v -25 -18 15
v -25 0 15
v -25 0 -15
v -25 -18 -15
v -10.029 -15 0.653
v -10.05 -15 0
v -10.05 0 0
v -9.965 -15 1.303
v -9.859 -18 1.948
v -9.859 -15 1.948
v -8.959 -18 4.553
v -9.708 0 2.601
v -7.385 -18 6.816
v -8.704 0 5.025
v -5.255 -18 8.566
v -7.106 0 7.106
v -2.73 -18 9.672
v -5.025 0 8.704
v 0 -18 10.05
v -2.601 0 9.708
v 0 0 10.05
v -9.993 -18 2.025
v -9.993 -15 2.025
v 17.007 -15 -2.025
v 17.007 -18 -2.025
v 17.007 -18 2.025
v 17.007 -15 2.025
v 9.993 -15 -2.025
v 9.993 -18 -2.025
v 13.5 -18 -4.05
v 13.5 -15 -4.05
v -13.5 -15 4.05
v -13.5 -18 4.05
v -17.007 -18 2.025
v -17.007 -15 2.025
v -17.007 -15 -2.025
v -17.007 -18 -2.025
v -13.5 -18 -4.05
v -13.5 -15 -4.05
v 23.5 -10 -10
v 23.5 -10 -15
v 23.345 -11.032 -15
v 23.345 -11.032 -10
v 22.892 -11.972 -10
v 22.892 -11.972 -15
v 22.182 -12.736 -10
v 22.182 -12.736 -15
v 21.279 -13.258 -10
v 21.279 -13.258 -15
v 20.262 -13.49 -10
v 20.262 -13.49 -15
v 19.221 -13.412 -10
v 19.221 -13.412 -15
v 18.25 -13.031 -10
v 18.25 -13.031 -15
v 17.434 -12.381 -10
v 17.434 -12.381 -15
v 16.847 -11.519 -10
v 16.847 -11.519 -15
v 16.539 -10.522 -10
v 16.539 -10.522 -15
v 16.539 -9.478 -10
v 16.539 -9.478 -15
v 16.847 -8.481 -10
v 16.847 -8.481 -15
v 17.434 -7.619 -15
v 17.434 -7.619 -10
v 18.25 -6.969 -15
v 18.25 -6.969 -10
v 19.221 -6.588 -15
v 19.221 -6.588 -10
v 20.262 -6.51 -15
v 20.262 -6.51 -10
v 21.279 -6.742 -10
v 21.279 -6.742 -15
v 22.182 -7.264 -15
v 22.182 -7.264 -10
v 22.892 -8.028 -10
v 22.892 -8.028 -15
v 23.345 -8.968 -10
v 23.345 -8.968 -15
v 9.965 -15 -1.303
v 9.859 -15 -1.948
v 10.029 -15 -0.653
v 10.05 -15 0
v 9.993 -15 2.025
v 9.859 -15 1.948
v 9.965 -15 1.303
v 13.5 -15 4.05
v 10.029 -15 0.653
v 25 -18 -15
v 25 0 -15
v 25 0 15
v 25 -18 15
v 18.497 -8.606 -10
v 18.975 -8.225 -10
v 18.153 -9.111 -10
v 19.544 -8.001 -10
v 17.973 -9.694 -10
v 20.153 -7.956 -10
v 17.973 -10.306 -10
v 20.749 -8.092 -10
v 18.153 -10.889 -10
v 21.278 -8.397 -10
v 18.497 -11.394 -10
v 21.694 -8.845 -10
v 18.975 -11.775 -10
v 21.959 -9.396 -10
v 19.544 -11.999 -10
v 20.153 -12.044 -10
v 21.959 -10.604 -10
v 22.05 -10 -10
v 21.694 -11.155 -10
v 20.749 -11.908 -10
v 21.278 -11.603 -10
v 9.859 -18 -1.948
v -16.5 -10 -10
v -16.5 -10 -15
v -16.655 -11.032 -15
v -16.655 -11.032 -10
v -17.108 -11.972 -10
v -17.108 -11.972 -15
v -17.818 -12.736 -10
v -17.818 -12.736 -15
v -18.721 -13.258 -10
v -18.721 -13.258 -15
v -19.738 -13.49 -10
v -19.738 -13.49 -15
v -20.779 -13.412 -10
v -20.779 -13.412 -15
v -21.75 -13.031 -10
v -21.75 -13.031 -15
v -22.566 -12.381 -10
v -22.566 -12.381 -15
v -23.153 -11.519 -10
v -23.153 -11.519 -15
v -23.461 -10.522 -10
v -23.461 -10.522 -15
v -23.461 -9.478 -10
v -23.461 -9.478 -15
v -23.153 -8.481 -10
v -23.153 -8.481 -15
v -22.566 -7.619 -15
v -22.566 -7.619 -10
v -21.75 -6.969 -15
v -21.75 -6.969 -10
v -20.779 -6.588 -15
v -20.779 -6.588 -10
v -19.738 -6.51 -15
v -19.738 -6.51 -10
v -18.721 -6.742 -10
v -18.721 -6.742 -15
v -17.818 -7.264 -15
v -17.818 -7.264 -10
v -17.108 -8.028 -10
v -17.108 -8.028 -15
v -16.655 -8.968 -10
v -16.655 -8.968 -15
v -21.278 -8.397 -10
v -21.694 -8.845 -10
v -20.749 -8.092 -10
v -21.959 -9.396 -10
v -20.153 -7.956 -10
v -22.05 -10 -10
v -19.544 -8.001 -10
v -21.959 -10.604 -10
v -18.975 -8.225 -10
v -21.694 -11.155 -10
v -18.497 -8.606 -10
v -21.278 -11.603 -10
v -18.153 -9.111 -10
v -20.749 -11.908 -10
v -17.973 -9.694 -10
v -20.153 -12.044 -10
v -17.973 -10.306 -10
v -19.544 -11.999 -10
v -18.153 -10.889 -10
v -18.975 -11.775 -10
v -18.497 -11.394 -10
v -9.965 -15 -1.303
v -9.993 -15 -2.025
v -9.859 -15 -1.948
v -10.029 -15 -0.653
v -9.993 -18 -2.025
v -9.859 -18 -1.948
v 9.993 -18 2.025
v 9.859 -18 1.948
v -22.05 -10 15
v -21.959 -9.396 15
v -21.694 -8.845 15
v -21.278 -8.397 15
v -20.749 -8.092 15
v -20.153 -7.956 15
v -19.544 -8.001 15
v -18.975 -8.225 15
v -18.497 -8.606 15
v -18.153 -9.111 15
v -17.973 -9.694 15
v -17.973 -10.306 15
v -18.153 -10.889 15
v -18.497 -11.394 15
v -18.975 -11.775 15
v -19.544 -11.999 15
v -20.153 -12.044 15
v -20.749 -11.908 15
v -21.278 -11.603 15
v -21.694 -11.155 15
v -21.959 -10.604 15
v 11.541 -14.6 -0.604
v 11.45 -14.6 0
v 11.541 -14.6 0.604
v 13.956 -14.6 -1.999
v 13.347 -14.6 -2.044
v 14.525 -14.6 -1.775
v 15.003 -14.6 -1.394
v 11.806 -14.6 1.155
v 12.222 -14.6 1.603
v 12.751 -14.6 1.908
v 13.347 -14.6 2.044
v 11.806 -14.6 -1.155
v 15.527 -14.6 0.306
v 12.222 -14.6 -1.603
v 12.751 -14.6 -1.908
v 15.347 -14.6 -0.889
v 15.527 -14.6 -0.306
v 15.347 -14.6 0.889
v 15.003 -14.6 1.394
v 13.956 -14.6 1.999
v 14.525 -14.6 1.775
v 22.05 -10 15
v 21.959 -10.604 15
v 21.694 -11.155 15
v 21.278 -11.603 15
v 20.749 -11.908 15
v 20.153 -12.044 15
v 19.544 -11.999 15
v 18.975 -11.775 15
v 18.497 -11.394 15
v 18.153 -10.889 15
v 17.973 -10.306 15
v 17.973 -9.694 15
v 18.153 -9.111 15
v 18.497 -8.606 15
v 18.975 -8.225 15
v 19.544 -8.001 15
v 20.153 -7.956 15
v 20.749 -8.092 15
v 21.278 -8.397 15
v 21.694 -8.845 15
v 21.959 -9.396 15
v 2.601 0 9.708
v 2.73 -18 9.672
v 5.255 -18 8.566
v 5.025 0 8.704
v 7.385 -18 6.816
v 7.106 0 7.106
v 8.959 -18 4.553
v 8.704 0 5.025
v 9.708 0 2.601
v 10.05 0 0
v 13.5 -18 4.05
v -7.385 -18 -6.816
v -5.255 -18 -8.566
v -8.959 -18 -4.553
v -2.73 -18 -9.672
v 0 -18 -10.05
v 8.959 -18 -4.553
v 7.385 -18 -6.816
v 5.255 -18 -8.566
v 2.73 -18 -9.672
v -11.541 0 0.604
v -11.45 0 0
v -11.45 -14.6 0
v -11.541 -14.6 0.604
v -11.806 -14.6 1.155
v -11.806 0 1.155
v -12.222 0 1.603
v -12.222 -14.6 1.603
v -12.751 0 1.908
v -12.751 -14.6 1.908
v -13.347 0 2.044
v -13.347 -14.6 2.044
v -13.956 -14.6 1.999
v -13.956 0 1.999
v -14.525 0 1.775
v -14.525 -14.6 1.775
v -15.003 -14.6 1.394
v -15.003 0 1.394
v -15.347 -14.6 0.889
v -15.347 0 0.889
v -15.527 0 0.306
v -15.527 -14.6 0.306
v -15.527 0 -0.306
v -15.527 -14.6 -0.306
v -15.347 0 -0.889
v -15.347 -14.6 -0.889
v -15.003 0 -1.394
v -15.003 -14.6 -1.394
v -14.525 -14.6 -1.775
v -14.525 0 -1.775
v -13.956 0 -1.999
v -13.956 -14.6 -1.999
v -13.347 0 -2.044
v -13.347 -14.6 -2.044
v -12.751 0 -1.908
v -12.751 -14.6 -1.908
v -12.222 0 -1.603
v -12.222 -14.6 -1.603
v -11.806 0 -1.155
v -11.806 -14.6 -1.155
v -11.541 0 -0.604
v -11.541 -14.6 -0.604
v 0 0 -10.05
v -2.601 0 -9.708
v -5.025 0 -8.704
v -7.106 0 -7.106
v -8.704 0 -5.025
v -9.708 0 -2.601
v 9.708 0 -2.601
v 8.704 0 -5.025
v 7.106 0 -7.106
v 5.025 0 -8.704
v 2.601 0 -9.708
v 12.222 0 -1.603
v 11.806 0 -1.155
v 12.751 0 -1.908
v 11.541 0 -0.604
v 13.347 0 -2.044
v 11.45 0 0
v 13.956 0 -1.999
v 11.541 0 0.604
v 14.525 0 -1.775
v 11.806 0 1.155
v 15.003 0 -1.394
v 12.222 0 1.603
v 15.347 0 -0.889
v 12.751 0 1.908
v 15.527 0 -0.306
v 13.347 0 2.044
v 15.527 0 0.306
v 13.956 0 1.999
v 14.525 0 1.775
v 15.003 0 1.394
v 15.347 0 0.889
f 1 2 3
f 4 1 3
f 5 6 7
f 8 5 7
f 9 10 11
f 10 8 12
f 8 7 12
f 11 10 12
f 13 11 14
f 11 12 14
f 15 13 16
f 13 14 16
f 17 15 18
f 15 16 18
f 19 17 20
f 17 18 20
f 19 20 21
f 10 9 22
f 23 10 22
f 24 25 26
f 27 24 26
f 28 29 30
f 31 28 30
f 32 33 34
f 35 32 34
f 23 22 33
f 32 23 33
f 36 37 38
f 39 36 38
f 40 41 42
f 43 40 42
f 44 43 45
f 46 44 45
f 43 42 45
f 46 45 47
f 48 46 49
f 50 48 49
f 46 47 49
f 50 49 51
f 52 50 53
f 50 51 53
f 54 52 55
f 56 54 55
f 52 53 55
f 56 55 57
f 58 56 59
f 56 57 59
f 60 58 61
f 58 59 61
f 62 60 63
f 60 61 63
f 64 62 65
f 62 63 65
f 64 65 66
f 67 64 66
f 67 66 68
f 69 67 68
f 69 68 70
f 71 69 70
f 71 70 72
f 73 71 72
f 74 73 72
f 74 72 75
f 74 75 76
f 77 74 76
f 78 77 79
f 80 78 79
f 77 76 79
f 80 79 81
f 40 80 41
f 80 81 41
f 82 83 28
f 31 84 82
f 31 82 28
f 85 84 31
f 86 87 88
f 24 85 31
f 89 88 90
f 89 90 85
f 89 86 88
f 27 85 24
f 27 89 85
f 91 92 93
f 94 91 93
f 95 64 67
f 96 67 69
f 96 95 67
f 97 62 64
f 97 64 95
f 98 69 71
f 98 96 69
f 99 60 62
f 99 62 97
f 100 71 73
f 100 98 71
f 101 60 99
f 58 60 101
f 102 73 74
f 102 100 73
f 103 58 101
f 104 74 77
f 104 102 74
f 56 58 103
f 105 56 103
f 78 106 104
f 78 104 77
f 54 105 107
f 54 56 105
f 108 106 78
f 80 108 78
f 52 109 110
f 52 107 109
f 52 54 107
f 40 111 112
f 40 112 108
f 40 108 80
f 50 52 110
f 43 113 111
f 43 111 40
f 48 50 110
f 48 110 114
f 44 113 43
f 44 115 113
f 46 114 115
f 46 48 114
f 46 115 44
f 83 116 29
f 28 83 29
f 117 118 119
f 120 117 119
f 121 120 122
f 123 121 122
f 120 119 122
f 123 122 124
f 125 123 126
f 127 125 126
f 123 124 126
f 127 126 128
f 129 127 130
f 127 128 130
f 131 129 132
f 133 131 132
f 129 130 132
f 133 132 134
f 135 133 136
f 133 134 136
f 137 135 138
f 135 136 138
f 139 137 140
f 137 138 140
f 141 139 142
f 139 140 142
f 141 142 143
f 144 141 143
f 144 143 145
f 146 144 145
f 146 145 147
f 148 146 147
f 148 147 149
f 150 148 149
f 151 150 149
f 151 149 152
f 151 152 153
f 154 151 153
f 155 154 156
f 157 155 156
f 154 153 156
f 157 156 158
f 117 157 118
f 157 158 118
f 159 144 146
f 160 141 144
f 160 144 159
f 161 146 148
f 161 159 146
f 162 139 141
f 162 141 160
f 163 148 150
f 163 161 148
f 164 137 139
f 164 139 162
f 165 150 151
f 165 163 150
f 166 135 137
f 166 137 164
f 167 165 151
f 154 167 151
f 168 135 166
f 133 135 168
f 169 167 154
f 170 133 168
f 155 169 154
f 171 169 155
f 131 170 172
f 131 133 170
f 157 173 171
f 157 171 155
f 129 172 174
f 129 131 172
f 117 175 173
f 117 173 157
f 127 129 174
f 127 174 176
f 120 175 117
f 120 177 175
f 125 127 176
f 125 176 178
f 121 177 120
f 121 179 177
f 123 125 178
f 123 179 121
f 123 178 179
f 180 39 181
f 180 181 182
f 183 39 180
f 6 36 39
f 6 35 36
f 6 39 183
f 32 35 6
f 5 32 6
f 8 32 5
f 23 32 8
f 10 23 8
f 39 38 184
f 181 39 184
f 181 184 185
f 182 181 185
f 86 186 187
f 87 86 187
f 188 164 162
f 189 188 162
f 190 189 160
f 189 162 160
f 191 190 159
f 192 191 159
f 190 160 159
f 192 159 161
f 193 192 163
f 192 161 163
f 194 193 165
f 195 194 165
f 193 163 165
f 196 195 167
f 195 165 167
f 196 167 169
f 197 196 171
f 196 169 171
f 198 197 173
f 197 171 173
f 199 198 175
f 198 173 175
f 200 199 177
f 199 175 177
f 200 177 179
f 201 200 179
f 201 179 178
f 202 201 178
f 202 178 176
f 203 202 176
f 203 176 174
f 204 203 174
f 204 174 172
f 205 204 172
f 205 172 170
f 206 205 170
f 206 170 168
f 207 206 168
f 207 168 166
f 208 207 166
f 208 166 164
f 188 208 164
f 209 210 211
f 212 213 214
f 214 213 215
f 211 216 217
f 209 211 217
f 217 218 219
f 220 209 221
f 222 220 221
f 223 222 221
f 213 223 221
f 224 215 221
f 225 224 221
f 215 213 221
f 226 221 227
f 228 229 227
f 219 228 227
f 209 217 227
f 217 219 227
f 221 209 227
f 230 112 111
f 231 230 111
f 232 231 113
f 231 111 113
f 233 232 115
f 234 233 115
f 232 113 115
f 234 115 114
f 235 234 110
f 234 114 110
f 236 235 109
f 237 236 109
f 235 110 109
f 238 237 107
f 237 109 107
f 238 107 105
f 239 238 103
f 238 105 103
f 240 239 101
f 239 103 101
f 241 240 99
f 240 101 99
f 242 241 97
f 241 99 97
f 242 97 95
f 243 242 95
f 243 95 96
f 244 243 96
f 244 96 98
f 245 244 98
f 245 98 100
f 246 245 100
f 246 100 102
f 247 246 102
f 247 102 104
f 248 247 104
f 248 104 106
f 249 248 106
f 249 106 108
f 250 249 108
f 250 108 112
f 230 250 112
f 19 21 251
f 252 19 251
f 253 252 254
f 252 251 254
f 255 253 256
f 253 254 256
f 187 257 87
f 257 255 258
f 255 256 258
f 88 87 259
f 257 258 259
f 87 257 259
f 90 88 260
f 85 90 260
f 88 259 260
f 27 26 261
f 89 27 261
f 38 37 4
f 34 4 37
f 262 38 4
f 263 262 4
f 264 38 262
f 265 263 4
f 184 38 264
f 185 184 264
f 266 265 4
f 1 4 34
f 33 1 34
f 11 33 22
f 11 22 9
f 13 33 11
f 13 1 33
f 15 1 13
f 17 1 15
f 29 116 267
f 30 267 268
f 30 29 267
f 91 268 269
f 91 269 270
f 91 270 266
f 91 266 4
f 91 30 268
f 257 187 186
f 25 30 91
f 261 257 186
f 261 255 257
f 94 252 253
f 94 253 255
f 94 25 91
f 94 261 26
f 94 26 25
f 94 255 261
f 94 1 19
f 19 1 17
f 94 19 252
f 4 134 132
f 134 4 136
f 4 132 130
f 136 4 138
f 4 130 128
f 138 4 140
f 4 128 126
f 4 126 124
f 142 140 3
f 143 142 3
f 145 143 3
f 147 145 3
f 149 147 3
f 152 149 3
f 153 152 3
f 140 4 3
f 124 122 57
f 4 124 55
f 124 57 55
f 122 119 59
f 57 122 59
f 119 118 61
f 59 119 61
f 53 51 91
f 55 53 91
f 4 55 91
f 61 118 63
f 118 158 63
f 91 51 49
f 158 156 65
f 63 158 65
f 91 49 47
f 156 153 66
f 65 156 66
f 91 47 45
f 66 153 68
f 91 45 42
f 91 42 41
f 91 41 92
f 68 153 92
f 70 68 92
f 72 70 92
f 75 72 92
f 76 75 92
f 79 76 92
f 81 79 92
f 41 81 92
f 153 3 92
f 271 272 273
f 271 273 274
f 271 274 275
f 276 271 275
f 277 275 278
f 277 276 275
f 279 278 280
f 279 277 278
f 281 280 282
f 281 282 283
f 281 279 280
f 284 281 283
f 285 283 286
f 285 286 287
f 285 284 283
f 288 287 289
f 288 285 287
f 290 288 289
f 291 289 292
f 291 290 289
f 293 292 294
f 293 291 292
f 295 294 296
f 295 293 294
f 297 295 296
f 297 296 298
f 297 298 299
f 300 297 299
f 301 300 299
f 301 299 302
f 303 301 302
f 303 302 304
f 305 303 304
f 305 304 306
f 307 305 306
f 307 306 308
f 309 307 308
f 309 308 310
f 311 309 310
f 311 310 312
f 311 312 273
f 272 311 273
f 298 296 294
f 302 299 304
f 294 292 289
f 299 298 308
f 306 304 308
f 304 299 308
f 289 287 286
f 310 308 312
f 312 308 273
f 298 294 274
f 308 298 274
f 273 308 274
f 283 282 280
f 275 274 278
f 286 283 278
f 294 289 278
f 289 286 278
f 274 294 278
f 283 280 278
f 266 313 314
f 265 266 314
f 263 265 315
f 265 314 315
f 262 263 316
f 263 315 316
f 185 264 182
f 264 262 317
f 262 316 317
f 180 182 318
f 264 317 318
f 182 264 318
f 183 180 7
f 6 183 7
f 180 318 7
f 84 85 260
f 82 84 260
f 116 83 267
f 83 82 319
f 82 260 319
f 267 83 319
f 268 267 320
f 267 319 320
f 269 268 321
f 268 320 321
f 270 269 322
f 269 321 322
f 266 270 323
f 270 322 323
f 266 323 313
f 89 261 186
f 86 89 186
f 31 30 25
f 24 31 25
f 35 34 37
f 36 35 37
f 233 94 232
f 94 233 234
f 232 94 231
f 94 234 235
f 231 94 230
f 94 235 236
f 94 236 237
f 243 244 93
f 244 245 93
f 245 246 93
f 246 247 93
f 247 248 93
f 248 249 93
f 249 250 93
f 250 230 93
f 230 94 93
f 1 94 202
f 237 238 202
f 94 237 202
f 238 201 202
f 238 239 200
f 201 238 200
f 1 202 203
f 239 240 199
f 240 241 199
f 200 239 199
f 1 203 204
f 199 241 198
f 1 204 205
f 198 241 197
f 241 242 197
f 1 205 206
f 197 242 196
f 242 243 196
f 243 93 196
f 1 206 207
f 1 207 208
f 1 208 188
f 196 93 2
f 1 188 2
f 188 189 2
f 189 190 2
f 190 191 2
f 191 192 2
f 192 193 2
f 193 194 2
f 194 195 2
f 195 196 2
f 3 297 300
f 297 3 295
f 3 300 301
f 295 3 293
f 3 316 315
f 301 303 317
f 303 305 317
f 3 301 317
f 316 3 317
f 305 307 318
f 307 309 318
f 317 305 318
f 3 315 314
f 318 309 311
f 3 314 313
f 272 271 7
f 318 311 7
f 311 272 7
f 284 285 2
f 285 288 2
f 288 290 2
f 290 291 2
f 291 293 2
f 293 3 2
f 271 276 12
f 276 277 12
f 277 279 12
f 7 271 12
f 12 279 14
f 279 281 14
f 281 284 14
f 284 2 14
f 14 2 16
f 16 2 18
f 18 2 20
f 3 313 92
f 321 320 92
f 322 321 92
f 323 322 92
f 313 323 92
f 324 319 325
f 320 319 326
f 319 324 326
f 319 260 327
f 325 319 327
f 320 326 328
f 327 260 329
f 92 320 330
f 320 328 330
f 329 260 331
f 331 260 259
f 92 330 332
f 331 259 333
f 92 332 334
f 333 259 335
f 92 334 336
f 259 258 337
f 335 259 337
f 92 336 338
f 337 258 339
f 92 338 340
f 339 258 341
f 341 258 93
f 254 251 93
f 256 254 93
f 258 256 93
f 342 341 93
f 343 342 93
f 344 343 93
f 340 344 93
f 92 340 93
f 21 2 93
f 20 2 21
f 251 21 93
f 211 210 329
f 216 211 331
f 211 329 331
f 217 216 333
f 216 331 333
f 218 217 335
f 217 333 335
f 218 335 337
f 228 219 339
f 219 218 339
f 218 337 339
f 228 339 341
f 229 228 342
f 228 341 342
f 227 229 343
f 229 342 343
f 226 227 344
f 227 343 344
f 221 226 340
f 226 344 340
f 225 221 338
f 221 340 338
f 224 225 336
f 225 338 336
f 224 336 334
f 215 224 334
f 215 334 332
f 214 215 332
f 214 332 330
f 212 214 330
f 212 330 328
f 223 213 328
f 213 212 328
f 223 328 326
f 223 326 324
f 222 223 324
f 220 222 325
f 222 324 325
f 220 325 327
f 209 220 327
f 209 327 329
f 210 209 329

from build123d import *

# Parameters (mm, degrees)
F0_R      = 2.05
F1_DEPTH  = 18
F3_DEPTH  = 30
F4_R      = 3.5
F5_DEPTH  = 5
F7_DEPTH  = 3
F8_R      = 2.05
F9_R      = 2.05
F10_DEPTH = 0.4


with BuildPart() as f1:
    # F0 (on Front) → F1 (new body)
    with BuildSketch(Plane.XZ):
        with BuildLine():
            ThreePointArc((0, 10.05), (7.1064231509, 7.1064231509), (10.05, 0))
            ThreePointArc((10.05, 0), (7.1064231509, -7.1064231509), (0, -10.05))
            Line((0, -10.05), (0, -15))
            Line((0, -15), (25, -15))
            Line((25, -15), (25, 0))
            Line((25, 0), (25, 15))
            Line((25, 15), (0, 15))
            Line((0, 15), (0, 10.05))
        make_face()
        with BuildLine():
            ThreePointArc((15.55, 0), (13.5, -2.05), (11.45, 0))
            ThreePointArc((11.45, 0), (13.5, 2.05), (15.55, 0))
        make_face(mode=Mode.SUBTRACT)
        with BuildLine():
            ThreePointArc((-10.05, 0), (-7.1064231509, 7.1064231509), (0, 10.05))
            Line((0, 10.05), (0, 15))
            Line((0, 15), (-25, 15))
            Line((-25, 15), (-25, 0))
            Line((-25, 0), (-25, -15))
            Line((-25, -15), (0, -15))
            Line((0, -15), (0, -10.05))
            ThreePointArc((0, -10.05), (-7.1064231509, -7.1064231509), (-10.05, 0))
        make_face()
        with Locations((-13.5, 0)):
            Circle(F0_R, mode=Mode.SUBTRACT)
    extrude(amount=F1_DEPTH)

    # F2 (on face) → F3 (cut)
    with BuildSketch(Plane(origin=(0, 0, -15), x_dir=(1, 0, 0), z_dir=(0, 0, -1))):
        with BuildLine():
            ThreePointArc((17.95, 10), (20, 7.95), (22.05, 10))
            Line((22.05, 10), (17.95, 10))
        make_face()
        with BuildLine():
            Line((17.95, 10), (22.05, 10))
            ThreePointArc((22.05, 10), (20, 12.05), (17.95, 10))
        make_face()
        with BuildLine():
            ThreePointArc((-17.95, 10), (-20, 12.05), (-22.05, 10))
            Line((-22.05, 10), (-17.95, 10))
        make_face()
        with BuildLine():
            Line((-17.95, 10), (-22.05, 10))
            ThreePointArc((-22.05, 10), (-20, 7.95), (-17.95, 10))
        make_face()
    extrude(amount=-F3_DEPTH, mode=Mode.SUBTRACT)

    # F4 (on face) → F5 (cut)
    with BuildSketch(Plane(origin=(0, 0, -15), x_dir=(1, 0, 0), z_dir=(0, 0, -1))):
        with Locations((20, 10)):
            Circle(F4_R)
        with Locations((-20, 10)):
            Circle(F4_R)
    extrude(amount=-F5_DEPTH, mode=Mode.SUBTRACT)

    # F6 (on face) → F7 (cut)
    with BuildSketch(Plane.XZ.offset(18)):
        Polygon((-13.5, 4.05), (-13.5, 0), (-13.5, -4.05), (-9.9925971147, -2.025), (-7.9662247081, -0.8550733456), (-7.7903810671, 0.7535499721), (-9.9925971147, 2.025), align=None)
        Polygon((-13.5, -4.05), (-13.5, 0), (-13.5, 4.05), (-17.0074028853, 2.025), (-17.0074028853, -2.025), align=None)
        Polygon((13.5, -4.05), (13.5, 0), (13.5, 4.05), (9.9925971147, 2.025), (9.9925971147, -2.025), align=None)
        Polygon((13.5, 4.05), (13.5, 0), (13.5, -4.05), (17.0074028853, -2.025), (17.0074028853, 2.025), align=None)
        Polygon((9.9925971147, -2.025), (9.9925971147, 2.025), (7.4926645733, 0.5816632743), (7.2557264377, -0.4448669779), align=None)
    extrude(amount=-F7_DEPTH, mode=Mode.SUBTRACT)

    # F8 (on face) + F9 (on face) → F10 (join)
    with BuildSketch(Plane.XZ.offset(15)):
        with Locations((13.5, 0)):
            Circle(F8_R)
    with BuildSketch(Plane.XZ.offset(15)):
        with Locations((-13.5, 0)):
            Circle(F9_R)
    extrude(amount=-F10_DEPTH)


solid = f1.part
